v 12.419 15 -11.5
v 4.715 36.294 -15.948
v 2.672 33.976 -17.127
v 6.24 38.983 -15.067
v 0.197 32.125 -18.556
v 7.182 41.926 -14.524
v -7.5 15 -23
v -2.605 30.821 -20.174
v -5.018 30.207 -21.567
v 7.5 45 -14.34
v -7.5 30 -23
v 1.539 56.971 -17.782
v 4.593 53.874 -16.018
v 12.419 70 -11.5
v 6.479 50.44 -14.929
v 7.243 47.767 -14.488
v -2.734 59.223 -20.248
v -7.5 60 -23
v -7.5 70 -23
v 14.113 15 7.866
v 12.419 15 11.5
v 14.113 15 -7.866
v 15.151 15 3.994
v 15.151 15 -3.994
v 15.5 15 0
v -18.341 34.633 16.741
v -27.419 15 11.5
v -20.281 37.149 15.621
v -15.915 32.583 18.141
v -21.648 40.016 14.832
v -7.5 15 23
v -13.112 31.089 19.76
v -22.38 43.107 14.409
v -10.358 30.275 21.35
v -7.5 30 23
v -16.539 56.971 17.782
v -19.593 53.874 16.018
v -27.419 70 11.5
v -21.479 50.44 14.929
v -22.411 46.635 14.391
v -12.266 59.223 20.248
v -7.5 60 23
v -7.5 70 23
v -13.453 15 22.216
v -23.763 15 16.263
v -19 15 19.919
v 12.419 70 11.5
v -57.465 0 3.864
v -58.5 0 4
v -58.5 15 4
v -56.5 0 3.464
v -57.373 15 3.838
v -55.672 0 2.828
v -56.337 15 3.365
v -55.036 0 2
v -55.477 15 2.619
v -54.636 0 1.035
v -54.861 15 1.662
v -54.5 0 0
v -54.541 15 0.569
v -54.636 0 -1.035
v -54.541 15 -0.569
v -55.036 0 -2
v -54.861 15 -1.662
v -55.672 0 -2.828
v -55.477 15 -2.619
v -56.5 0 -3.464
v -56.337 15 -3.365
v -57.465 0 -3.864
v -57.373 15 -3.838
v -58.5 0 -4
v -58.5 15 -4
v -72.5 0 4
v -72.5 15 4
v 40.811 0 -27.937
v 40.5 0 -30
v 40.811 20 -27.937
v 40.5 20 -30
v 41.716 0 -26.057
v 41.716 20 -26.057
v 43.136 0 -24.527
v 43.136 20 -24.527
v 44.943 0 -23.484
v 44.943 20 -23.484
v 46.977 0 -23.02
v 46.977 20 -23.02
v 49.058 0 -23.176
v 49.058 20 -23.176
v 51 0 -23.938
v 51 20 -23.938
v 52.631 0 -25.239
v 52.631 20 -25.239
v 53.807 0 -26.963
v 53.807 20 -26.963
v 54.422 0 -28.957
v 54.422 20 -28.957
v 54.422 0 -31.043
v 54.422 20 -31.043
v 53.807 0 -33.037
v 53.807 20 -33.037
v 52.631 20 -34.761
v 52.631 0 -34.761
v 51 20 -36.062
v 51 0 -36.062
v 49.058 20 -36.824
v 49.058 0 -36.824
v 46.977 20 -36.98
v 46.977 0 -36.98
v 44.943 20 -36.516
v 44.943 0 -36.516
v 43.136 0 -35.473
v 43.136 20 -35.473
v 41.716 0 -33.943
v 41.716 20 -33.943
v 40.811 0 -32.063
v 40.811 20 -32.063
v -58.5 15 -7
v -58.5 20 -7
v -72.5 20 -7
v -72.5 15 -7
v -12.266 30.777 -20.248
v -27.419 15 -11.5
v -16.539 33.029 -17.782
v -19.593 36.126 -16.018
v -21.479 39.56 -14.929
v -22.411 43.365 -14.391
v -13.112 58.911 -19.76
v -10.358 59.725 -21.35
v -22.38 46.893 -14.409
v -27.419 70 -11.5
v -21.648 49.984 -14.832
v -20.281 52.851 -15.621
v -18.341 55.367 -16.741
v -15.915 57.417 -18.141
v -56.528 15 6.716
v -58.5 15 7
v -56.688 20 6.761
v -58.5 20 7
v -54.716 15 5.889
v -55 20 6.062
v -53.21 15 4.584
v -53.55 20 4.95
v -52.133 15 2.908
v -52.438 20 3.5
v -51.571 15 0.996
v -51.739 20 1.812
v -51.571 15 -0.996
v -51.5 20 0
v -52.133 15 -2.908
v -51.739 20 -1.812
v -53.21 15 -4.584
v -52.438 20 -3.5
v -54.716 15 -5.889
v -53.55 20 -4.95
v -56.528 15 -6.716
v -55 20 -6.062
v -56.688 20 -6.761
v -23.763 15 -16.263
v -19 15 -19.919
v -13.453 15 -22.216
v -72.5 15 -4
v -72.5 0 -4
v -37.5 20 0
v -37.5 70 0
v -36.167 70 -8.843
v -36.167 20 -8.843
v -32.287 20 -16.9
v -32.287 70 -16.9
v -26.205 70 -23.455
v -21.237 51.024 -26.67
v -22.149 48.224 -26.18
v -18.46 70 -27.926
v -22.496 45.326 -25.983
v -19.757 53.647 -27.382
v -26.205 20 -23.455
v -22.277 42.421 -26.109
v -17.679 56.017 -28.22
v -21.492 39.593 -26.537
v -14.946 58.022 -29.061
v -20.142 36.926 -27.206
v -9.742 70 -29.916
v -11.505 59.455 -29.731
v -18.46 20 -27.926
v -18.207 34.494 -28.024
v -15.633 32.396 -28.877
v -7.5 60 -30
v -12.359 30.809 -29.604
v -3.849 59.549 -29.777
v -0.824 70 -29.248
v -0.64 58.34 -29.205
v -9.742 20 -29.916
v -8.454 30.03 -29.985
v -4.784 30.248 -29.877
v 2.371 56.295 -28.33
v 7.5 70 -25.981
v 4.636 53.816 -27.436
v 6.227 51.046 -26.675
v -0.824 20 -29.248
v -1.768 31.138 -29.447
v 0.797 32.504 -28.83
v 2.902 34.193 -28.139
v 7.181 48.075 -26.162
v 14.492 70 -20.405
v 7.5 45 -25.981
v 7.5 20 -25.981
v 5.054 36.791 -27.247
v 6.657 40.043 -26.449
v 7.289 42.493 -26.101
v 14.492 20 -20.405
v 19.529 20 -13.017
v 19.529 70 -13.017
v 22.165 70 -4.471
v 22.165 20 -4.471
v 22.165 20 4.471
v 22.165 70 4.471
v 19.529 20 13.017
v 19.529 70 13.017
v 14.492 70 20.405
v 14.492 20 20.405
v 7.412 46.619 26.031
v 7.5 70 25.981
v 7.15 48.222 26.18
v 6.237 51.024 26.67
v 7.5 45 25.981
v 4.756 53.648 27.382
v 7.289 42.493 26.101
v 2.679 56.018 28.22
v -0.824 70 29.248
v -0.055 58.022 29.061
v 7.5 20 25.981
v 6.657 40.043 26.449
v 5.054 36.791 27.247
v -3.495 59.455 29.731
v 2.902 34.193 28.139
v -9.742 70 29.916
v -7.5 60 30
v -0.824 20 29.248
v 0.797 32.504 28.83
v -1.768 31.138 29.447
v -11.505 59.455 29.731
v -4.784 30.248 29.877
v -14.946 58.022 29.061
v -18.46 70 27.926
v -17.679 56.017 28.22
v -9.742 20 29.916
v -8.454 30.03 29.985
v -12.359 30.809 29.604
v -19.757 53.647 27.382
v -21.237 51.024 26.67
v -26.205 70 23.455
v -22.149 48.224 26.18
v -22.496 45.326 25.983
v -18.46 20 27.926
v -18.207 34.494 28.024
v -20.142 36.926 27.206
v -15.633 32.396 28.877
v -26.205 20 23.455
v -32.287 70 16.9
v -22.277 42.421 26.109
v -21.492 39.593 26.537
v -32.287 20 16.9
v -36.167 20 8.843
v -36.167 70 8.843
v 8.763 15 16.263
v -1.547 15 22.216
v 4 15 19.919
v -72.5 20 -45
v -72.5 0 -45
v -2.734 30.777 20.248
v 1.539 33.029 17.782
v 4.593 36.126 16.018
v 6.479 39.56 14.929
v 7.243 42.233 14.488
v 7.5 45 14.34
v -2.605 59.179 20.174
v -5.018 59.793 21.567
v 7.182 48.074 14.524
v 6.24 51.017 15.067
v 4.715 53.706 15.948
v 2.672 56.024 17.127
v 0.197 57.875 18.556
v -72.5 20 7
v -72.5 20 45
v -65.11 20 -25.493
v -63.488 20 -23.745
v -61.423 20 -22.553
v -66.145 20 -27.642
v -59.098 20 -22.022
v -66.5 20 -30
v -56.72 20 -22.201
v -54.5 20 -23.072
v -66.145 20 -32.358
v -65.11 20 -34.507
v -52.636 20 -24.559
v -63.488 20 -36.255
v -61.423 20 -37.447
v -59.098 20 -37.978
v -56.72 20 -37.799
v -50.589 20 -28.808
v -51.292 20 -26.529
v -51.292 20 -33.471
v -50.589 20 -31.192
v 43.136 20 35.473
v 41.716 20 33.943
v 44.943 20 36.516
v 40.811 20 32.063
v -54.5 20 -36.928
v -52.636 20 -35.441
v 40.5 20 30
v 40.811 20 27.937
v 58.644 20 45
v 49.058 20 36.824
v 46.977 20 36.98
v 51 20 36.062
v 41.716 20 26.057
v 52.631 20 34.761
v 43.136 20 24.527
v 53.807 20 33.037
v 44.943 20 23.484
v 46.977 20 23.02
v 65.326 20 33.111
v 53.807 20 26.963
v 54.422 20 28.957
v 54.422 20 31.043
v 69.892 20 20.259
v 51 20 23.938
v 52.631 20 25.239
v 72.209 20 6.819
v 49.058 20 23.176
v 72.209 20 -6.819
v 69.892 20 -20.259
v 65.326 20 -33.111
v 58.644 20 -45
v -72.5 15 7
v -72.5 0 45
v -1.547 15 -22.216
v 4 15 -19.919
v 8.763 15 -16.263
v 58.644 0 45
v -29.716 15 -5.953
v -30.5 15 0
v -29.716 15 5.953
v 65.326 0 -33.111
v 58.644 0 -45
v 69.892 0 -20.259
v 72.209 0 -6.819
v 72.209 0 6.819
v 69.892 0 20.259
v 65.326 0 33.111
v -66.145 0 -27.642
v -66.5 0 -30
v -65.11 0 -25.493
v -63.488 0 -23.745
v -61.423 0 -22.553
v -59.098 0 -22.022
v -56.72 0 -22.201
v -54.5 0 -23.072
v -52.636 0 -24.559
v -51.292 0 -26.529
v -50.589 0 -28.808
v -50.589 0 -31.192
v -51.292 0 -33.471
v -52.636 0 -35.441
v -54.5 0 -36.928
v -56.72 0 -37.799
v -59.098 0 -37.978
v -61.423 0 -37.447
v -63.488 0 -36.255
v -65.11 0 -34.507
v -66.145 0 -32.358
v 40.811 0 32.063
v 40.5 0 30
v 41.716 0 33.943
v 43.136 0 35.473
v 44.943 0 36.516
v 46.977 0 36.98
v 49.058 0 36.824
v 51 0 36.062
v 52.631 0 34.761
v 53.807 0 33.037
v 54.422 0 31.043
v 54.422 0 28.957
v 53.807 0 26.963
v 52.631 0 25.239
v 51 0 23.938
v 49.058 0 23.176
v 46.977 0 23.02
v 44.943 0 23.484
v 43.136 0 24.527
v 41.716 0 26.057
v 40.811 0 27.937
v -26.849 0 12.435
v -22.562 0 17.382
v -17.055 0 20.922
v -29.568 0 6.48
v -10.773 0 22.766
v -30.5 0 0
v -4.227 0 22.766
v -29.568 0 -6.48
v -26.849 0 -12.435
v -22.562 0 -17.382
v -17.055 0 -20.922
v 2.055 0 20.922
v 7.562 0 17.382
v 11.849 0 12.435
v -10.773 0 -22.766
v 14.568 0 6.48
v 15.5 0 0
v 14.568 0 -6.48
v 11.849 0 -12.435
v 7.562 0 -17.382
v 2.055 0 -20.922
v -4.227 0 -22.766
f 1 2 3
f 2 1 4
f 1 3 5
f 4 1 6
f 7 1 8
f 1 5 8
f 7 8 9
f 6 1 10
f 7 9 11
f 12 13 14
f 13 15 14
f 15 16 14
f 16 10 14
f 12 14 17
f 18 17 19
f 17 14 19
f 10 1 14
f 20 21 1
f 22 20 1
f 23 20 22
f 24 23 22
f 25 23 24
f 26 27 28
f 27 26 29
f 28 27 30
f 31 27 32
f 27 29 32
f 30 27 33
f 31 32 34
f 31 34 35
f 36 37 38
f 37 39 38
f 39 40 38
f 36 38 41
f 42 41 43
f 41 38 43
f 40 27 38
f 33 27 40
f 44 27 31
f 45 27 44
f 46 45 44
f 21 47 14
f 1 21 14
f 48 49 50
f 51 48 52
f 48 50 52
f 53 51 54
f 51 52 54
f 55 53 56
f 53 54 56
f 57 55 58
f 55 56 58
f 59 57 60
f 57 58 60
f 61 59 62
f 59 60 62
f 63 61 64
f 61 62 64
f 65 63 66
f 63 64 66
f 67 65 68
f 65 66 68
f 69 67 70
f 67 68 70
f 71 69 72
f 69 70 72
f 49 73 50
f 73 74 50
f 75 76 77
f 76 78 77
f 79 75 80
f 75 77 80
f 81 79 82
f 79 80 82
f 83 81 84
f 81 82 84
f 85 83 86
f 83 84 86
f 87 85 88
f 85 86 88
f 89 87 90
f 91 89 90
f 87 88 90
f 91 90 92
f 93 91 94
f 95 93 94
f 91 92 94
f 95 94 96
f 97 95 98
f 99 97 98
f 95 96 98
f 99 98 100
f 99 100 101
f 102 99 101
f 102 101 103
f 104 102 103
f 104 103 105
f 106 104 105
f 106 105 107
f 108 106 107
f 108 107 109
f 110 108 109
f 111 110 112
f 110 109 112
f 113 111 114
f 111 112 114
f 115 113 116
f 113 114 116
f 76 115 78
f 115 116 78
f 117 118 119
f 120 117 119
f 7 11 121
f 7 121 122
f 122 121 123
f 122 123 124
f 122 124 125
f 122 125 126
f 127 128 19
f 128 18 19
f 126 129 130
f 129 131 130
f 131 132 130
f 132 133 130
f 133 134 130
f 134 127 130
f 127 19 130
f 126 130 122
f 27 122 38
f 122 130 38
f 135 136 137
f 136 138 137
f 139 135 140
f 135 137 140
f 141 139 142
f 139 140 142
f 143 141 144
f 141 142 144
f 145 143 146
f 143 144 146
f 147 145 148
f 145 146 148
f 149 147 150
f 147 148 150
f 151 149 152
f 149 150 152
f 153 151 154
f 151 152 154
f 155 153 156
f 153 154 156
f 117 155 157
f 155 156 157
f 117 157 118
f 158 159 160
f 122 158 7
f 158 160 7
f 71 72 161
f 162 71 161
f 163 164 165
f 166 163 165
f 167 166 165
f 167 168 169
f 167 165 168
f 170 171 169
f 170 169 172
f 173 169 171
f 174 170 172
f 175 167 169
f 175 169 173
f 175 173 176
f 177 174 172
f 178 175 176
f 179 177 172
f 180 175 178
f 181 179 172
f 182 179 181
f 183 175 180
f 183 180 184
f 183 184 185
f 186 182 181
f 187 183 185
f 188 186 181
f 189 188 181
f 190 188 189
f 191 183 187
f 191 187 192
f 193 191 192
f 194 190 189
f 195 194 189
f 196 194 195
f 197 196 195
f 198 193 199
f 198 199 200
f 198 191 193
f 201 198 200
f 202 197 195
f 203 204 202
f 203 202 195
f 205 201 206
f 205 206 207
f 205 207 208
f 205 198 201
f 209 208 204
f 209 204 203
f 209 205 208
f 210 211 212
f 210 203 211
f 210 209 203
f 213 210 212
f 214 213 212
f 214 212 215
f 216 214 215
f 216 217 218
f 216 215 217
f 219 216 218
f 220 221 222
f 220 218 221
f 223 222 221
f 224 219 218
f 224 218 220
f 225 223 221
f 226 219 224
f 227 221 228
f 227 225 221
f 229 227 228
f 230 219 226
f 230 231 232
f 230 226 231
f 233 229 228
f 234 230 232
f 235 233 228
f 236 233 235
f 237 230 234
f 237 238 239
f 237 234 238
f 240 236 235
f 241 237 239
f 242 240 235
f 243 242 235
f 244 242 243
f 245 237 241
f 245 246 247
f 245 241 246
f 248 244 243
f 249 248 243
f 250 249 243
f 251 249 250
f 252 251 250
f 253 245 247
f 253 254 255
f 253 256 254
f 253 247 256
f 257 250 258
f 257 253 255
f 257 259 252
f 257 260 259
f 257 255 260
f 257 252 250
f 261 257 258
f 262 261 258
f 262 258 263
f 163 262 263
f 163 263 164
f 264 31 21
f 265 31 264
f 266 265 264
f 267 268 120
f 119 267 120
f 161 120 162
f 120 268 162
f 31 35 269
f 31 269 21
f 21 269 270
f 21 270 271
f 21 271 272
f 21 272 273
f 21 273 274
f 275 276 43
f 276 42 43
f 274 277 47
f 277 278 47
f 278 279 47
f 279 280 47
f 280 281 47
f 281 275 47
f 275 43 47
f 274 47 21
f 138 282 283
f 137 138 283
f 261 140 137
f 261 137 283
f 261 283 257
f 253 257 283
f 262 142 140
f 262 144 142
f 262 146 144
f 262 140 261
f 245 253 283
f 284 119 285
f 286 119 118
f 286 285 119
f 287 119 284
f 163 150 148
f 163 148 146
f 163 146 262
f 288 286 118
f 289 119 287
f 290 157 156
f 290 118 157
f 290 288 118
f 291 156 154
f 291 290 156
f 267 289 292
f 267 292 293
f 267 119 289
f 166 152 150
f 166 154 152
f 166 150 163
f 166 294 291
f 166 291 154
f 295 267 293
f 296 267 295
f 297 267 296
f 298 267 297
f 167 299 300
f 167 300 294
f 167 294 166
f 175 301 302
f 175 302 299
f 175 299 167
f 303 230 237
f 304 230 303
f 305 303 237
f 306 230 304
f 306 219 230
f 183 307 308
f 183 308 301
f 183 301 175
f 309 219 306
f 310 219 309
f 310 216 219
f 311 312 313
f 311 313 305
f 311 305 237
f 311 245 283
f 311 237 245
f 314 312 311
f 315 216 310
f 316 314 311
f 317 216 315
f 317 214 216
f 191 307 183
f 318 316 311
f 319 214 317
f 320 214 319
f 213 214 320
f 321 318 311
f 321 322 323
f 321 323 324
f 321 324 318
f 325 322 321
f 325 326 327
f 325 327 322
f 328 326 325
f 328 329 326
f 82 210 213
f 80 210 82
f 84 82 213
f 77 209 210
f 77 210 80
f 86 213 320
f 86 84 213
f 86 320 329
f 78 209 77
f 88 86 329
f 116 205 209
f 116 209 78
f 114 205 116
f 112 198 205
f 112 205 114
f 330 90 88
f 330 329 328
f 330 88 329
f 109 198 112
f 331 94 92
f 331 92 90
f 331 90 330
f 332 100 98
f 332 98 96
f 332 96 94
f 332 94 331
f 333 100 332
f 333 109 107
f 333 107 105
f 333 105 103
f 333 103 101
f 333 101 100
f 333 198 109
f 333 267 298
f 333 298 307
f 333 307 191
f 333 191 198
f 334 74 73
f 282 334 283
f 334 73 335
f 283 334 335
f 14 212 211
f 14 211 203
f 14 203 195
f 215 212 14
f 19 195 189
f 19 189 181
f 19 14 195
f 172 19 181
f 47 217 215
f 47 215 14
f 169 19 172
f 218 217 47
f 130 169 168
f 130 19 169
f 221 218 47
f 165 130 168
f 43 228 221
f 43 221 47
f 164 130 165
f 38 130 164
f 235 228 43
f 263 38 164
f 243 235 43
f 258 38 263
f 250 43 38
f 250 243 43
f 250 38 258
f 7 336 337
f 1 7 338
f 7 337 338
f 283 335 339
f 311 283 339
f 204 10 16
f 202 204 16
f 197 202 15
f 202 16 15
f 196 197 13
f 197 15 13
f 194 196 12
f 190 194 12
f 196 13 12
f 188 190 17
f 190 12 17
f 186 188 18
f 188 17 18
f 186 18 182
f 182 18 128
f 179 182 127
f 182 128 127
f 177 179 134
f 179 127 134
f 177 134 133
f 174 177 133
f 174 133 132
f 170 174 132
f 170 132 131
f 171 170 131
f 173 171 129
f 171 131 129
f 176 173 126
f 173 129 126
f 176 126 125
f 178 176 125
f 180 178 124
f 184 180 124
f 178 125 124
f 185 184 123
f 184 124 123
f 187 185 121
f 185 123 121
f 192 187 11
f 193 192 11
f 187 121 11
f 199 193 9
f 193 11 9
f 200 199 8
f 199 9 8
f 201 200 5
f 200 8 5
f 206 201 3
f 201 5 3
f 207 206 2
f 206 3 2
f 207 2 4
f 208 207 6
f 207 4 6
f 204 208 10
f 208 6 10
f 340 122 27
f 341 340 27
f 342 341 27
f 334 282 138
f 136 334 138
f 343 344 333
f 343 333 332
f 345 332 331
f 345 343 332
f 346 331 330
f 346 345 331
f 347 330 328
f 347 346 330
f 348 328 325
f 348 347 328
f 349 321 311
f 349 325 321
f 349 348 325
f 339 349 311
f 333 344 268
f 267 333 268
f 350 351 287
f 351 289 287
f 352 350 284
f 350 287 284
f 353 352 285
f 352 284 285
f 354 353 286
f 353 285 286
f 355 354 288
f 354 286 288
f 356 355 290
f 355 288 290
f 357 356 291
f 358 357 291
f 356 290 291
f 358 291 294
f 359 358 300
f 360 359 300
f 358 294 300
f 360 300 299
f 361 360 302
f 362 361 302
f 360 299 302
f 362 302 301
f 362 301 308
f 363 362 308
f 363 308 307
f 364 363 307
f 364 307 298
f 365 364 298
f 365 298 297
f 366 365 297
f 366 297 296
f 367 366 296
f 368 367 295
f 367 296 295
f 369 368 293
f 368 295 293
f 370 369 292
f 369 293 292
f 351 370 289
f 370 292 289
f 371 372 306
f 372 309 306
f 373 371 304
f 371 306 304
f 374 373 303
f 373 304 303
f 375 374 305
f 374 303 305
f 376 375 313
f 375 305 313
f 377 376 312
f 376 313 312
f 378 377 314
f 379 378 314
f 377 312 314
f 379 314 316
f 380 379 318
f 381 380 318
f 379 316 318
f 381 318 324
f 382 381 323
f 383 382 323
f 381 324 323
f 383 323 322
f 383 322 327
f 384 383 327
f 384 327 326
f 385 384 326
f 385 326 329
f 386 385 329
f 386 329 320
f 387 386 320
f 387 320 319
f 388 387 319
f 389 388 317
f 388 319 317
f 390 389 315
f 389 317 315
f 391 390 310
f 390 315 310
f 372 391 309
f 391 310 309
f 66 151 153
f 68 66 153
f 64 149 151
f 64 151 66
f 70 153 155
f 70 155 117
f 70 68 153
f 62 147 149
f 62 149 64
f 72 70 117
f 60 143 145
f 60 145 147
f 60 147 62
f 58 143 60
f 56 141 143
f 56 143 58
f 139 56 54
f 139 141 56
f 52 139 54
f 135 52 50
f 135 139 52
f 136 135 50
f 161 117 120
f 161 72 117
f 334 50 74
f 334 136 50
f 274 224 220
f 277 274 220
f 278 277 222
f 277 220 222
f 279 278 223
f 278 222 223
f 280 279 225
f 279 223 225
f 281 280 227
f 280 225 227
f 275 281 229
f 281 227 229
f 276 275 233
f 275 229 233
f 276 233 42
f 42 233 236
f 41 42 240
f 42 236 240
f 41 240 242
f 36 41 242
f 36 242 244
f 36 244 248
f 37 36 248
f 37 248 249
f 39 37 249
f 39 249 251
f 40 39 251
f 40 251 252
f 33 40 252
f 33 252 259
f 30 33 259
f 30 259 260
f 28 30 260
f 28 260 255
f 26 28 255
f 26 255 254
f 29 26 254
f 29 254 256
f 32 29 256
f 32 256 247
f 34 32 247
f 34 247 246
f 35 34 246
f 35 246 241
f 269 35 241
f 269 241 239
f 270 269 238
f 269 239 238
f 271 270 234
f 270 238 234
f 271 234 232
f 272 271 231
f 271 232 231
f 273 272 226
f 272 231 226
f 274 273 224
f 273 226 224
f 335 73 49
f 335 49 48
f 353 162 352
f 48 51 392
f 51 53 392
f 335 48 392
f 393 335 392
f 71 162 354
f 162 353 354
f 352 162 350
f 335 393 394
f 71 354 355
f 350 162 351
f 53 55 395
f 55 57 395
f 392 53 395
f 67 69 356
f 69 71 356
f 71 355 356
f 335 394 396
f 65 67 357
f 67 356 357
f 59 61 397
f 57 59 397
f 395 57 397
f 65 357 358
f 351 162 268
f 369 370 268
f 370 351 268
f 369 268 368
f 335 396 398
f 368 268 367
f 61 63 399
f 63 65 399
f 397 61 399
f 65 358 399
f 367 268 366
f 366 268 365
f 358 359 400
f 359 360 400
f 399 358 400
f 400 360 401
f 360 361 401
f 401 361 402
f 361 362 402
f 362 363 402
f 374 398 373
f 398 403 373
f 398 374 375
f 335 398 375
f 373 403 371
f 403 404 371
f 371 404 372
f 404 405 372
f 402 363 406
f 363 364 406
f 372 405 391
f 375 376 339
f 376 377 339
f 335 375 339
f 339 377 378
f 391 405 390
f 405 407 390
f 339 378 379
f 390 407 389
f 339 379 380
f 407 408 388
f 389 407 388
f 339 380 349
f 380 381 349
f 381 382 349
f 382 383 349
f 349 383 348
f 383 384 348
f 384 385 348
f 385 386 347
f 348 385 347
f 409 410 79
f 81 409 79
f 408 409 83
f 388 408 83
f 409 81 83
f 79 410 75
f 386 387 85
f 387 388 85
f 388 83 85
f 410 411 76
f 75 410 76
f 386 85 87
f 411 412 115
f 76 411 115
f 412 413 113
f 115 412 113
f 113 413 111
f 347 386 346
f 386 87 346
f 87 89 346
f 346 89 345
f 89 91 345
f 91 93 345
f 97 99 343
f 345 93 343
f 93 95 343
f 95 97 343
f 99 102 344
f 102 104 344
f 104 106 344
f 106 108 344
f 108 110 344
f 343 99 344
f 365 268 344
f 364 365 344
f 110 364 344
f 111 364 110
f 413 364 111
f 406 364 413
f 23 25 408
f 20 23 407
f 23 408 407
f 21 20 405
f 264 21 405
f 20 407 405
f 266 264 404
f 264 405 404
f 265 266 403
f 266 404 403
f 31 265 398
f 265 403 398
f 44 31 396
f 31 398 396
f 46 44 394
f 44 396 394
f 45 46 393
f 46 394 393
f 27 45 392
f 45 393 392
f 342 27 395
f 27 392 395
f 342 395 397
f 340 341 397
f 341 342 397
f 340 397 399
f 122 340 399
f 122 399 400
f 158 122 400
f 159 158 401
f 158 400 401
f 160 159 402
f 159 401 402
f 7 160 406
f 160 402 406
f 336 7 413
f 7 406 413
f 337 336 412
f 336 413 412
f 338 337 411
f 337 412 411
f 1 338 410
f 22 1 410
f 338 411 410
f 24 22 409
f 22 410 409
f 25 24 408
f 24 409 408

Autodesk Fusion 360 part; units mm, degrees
sketch "Sketch1" plane through (0, 0, 0) normal (0, 1, 0) x (1, 0, 0)
  line L0 (58.6438, 45) -> (-72.5, 45)
  line L1 (-72.5, 45) -> (-72.5, -45)
  line L2 (-72.5, -45) -> (58.6438, -45)
  line L3 (62.4739, 38.7769) -> (-72.5, -45) construction
  line L4 (-72.5, 45) -> (62.4739, -38.7769) construction
  line L5 (-72.5, 0) -> (-7.5, 0)
  arc A0 (58.6438, -45) -> (58.6438, 45) centre (-7.5, 0) ccw
  circle A1 centre (-7.5, 0) radius 23
  dimension "d2" = 90
  dimension "d3" = 65
  dimension "d4" = 160
  dimension "d7" = 46
extrude "Extrude2" add sketch "Sketch1" along normal blind 15 contours A1 makes body 1
extrude "Extrude1" add sketch "Sketch1" along normal blind 20 separate body contours A1 | L0 L1 L2 A0 makes body 2
combine "Combine1" operation cut target body 2 tool bodies 1
sketch "Sketch2" plane through (0, 20, 0) normal (0, 1, 0) x (-1, 0, 0)
  arc A0 (-58.6438, 45) -> (-58.6438, -45) centre (7.5, 0) ccw
  line L0 (-58.6438, -45) -> (72.5, -45)
  line L1 (72.5, -45) -> (72.5, 45)
  line L2 (72.5, 45) -> (-58.6438, 45)
  circle A1 centre (7.5, 0) radius 23
  circle A2 centre (7.5, 0) radius 30
  dimension "d10" = 60
extrude "Extrude3" add sketch "Sketch2" along normal blind 50 contours A1 | A2 bodies 2
sketch "Sketch3" plane through (0, 70, 0) normal (0, 1, 0) x (-1, 0, 0)
  circle A0 centre (7.5, 0) radius 30
  line L0 (7.5, -23) -> (27.4186, -11.5)
  line L1 (27.4186, -11.5) -> (27.4186, 11.5)
  line L2 (27.4186, 11.5) -> (7.5, 23)
  line L3 (7.5, 23) -> (-12.4186, 11.5)
  line L4 (-12.4186, 11.5) -> (-12.4186, -11.5)
  line L5 (-12.4186, -11.5) -> (7.5, -23)
  point P0 (7.5, 0)
  dimension "d13" = 23
extrude "Extrude4" cut sketch "Sketch3" against normal blind 55 contours L0 L1 L2 L3 L4 L5 bodies 2
ref_plane "WorkPlane1" through (-6.9281, 10, 45) normal (0, 0, 1) x (1, 0, 0)
sketch "Sketch4" plane through (-6.9281, 10, 45) normal (0, 0, 1) x (1, 0, 0)
  line L0 (29.4281, 60) -> (-30.5719, 60)
  line L1 (-30.5719, 10) -> (29.4281, 10)
  line L2 (-0.5719, 60) -> (-0.5719, 35)
  circle A0 centre (-0.5719, 35) radius 15
  dimension "d17" = 25
  dimension "d18" = 30
extrude "Extrude5" cut sketch "Sketch4" against normal blind 135 bodies 2
sketch "Sketch5" plane through (0, 20, 0) normal (0, 1, 0) x (-1, 0, 0)
  circle A0 centre (7.5, 0) radius 30
  arc A1 (-58.6438, 45) -> (-58.6438, -45) centre (7.5, 0) ccw
  line L0 (-58.6438, -45) -> (72.5, -45)
  line L1 (72.5, -45) -> (72.5, 45)
  line L2 (72.5, 45) -> (-58.6438, 45)
  line L3 (-47.5, -30) -> (62.5, -30)
  line L4 (62.5, -30) -> (62.5, 30)
  line L5 (62.5, 30) -> (-47.5, 30)
  line L6 (-47.5, 30) -> (-47.5, -30)
  line L7 (-47.5, -30) -> (62.5, 30) construction
  line L8 (62.5, -30) -> (-47.5, 30) construction
  line L9 (72.5, -45) -> (58.5, -45)
  line L10 (58.5, -45) -> (58.5, -30)
  line L11 (58.5, -30) -> (72.5, -30)
  line L12 (72.5, -30) -> (72.5, -45)
  circle A2 centre (-47.5, -30) radius 7
  circle A3 centre (-47.5, 30) radius 7
  circle A4 centre (58.5, -30) radius 8
  point P0 (7.5, 0)
  dimension "d21" = 110
  dimension "d22" = 60
  dimension "d23" = 14
  dimension "d24" = 15
  dimension "d25" = 14
  dimension "d26" = 14
  dimension "d27" = 16
extrude "Extrude6" cut sketch "Sketch5" against normal blind 20 contours L5 L6 A3 | L5 L6 A3 | L3 L6 A2 | L3 L6 A2 | L3 L4 L11 A4 | L3 L10 A4 | L4 L11 A4 | L3 L10 L11 A4 bodies 2
sketch "Sketch6" plane through (0, 20, 0) normal (0, 1, 0) x (-1, 0, 0)
  circle A0 centre (-47.5, 30) radius 7
  circle A1 centre (-47.5, -30) radius 7
  circle A2 centre (58.5, -30) radius 8
  circle A3 centre (7.5, 0) radius 30
  arc A4 (-58.6438, 45) -> (-58.6438, -45) centre (7.5, 0) ccw
  line L0 (-58.6438, -45) -> (72.5, -45)
  line L1 (72.5, -45) -> (72.5, 45)
  line L2 (72.5, 45) -> (-58.6438, 45)
  line L3 (58.5, -30) -> (58.5, 30) construction
  line L4 (72.5, 0) -> (58.5, 0) construction
  line L5 (58.5, -7) -> (79, -7)
  arc A5 (79, -7) -> (79, 7) centre (79, 0) ccw
  line L6 (79, 7) -> (58.5, 7)
  arc A6 (58.5, 7) -> (58.5, -7) centre (58.5, 0) ccw
  line L7 (58.5, 0) -> (79, 0) construction
  dimension "d30" = 14
extrude "Extrude7" cut sketch "Sketch6" against normal blind 5 contours L1 L5 L6 A6 bodies 2
sketch "Sketch7" plane through (0, 15, 0) normal (0, 1, 0) x (-1, 0, 0)
  arc A0 (58.5, 7) -> (58.5, -7) centre (58.5, 0) ccw
  line L0 (58.5, -7) -> (72.5, -7)
  line L1 (72.5, -7) -> (72.5, 7)
  line L2 (72.5, 7) -> (58.5, 7)
  line L3 (58.5, -4) -> (88, -4)
  arc A1 (88, -4) -> (88, 4) centre (88, 0) ccw
  line L4 (88, 4) -> (58.5, 4)
  arc A2 (58.5, 4) -> (58.5, -4) centre (58.5, 0) ccw
  line L5 (58.5, 0) -> (88, 0) construction
  dimension "d33" = 8
extrude "Extrude8" cut sketch "Sketch7" against normal blind 20 contours L1 L3 L4 A2 bodies 2
equation "d4 = ( 80 * 2 ) * 1 mm"
equation "d11 = 70 mm - 20 mm"
equation "d13 = ( 46 / 2 ) * 1 mm"
equation "d21 = ( 55 * 2 ) * 1 mm"
